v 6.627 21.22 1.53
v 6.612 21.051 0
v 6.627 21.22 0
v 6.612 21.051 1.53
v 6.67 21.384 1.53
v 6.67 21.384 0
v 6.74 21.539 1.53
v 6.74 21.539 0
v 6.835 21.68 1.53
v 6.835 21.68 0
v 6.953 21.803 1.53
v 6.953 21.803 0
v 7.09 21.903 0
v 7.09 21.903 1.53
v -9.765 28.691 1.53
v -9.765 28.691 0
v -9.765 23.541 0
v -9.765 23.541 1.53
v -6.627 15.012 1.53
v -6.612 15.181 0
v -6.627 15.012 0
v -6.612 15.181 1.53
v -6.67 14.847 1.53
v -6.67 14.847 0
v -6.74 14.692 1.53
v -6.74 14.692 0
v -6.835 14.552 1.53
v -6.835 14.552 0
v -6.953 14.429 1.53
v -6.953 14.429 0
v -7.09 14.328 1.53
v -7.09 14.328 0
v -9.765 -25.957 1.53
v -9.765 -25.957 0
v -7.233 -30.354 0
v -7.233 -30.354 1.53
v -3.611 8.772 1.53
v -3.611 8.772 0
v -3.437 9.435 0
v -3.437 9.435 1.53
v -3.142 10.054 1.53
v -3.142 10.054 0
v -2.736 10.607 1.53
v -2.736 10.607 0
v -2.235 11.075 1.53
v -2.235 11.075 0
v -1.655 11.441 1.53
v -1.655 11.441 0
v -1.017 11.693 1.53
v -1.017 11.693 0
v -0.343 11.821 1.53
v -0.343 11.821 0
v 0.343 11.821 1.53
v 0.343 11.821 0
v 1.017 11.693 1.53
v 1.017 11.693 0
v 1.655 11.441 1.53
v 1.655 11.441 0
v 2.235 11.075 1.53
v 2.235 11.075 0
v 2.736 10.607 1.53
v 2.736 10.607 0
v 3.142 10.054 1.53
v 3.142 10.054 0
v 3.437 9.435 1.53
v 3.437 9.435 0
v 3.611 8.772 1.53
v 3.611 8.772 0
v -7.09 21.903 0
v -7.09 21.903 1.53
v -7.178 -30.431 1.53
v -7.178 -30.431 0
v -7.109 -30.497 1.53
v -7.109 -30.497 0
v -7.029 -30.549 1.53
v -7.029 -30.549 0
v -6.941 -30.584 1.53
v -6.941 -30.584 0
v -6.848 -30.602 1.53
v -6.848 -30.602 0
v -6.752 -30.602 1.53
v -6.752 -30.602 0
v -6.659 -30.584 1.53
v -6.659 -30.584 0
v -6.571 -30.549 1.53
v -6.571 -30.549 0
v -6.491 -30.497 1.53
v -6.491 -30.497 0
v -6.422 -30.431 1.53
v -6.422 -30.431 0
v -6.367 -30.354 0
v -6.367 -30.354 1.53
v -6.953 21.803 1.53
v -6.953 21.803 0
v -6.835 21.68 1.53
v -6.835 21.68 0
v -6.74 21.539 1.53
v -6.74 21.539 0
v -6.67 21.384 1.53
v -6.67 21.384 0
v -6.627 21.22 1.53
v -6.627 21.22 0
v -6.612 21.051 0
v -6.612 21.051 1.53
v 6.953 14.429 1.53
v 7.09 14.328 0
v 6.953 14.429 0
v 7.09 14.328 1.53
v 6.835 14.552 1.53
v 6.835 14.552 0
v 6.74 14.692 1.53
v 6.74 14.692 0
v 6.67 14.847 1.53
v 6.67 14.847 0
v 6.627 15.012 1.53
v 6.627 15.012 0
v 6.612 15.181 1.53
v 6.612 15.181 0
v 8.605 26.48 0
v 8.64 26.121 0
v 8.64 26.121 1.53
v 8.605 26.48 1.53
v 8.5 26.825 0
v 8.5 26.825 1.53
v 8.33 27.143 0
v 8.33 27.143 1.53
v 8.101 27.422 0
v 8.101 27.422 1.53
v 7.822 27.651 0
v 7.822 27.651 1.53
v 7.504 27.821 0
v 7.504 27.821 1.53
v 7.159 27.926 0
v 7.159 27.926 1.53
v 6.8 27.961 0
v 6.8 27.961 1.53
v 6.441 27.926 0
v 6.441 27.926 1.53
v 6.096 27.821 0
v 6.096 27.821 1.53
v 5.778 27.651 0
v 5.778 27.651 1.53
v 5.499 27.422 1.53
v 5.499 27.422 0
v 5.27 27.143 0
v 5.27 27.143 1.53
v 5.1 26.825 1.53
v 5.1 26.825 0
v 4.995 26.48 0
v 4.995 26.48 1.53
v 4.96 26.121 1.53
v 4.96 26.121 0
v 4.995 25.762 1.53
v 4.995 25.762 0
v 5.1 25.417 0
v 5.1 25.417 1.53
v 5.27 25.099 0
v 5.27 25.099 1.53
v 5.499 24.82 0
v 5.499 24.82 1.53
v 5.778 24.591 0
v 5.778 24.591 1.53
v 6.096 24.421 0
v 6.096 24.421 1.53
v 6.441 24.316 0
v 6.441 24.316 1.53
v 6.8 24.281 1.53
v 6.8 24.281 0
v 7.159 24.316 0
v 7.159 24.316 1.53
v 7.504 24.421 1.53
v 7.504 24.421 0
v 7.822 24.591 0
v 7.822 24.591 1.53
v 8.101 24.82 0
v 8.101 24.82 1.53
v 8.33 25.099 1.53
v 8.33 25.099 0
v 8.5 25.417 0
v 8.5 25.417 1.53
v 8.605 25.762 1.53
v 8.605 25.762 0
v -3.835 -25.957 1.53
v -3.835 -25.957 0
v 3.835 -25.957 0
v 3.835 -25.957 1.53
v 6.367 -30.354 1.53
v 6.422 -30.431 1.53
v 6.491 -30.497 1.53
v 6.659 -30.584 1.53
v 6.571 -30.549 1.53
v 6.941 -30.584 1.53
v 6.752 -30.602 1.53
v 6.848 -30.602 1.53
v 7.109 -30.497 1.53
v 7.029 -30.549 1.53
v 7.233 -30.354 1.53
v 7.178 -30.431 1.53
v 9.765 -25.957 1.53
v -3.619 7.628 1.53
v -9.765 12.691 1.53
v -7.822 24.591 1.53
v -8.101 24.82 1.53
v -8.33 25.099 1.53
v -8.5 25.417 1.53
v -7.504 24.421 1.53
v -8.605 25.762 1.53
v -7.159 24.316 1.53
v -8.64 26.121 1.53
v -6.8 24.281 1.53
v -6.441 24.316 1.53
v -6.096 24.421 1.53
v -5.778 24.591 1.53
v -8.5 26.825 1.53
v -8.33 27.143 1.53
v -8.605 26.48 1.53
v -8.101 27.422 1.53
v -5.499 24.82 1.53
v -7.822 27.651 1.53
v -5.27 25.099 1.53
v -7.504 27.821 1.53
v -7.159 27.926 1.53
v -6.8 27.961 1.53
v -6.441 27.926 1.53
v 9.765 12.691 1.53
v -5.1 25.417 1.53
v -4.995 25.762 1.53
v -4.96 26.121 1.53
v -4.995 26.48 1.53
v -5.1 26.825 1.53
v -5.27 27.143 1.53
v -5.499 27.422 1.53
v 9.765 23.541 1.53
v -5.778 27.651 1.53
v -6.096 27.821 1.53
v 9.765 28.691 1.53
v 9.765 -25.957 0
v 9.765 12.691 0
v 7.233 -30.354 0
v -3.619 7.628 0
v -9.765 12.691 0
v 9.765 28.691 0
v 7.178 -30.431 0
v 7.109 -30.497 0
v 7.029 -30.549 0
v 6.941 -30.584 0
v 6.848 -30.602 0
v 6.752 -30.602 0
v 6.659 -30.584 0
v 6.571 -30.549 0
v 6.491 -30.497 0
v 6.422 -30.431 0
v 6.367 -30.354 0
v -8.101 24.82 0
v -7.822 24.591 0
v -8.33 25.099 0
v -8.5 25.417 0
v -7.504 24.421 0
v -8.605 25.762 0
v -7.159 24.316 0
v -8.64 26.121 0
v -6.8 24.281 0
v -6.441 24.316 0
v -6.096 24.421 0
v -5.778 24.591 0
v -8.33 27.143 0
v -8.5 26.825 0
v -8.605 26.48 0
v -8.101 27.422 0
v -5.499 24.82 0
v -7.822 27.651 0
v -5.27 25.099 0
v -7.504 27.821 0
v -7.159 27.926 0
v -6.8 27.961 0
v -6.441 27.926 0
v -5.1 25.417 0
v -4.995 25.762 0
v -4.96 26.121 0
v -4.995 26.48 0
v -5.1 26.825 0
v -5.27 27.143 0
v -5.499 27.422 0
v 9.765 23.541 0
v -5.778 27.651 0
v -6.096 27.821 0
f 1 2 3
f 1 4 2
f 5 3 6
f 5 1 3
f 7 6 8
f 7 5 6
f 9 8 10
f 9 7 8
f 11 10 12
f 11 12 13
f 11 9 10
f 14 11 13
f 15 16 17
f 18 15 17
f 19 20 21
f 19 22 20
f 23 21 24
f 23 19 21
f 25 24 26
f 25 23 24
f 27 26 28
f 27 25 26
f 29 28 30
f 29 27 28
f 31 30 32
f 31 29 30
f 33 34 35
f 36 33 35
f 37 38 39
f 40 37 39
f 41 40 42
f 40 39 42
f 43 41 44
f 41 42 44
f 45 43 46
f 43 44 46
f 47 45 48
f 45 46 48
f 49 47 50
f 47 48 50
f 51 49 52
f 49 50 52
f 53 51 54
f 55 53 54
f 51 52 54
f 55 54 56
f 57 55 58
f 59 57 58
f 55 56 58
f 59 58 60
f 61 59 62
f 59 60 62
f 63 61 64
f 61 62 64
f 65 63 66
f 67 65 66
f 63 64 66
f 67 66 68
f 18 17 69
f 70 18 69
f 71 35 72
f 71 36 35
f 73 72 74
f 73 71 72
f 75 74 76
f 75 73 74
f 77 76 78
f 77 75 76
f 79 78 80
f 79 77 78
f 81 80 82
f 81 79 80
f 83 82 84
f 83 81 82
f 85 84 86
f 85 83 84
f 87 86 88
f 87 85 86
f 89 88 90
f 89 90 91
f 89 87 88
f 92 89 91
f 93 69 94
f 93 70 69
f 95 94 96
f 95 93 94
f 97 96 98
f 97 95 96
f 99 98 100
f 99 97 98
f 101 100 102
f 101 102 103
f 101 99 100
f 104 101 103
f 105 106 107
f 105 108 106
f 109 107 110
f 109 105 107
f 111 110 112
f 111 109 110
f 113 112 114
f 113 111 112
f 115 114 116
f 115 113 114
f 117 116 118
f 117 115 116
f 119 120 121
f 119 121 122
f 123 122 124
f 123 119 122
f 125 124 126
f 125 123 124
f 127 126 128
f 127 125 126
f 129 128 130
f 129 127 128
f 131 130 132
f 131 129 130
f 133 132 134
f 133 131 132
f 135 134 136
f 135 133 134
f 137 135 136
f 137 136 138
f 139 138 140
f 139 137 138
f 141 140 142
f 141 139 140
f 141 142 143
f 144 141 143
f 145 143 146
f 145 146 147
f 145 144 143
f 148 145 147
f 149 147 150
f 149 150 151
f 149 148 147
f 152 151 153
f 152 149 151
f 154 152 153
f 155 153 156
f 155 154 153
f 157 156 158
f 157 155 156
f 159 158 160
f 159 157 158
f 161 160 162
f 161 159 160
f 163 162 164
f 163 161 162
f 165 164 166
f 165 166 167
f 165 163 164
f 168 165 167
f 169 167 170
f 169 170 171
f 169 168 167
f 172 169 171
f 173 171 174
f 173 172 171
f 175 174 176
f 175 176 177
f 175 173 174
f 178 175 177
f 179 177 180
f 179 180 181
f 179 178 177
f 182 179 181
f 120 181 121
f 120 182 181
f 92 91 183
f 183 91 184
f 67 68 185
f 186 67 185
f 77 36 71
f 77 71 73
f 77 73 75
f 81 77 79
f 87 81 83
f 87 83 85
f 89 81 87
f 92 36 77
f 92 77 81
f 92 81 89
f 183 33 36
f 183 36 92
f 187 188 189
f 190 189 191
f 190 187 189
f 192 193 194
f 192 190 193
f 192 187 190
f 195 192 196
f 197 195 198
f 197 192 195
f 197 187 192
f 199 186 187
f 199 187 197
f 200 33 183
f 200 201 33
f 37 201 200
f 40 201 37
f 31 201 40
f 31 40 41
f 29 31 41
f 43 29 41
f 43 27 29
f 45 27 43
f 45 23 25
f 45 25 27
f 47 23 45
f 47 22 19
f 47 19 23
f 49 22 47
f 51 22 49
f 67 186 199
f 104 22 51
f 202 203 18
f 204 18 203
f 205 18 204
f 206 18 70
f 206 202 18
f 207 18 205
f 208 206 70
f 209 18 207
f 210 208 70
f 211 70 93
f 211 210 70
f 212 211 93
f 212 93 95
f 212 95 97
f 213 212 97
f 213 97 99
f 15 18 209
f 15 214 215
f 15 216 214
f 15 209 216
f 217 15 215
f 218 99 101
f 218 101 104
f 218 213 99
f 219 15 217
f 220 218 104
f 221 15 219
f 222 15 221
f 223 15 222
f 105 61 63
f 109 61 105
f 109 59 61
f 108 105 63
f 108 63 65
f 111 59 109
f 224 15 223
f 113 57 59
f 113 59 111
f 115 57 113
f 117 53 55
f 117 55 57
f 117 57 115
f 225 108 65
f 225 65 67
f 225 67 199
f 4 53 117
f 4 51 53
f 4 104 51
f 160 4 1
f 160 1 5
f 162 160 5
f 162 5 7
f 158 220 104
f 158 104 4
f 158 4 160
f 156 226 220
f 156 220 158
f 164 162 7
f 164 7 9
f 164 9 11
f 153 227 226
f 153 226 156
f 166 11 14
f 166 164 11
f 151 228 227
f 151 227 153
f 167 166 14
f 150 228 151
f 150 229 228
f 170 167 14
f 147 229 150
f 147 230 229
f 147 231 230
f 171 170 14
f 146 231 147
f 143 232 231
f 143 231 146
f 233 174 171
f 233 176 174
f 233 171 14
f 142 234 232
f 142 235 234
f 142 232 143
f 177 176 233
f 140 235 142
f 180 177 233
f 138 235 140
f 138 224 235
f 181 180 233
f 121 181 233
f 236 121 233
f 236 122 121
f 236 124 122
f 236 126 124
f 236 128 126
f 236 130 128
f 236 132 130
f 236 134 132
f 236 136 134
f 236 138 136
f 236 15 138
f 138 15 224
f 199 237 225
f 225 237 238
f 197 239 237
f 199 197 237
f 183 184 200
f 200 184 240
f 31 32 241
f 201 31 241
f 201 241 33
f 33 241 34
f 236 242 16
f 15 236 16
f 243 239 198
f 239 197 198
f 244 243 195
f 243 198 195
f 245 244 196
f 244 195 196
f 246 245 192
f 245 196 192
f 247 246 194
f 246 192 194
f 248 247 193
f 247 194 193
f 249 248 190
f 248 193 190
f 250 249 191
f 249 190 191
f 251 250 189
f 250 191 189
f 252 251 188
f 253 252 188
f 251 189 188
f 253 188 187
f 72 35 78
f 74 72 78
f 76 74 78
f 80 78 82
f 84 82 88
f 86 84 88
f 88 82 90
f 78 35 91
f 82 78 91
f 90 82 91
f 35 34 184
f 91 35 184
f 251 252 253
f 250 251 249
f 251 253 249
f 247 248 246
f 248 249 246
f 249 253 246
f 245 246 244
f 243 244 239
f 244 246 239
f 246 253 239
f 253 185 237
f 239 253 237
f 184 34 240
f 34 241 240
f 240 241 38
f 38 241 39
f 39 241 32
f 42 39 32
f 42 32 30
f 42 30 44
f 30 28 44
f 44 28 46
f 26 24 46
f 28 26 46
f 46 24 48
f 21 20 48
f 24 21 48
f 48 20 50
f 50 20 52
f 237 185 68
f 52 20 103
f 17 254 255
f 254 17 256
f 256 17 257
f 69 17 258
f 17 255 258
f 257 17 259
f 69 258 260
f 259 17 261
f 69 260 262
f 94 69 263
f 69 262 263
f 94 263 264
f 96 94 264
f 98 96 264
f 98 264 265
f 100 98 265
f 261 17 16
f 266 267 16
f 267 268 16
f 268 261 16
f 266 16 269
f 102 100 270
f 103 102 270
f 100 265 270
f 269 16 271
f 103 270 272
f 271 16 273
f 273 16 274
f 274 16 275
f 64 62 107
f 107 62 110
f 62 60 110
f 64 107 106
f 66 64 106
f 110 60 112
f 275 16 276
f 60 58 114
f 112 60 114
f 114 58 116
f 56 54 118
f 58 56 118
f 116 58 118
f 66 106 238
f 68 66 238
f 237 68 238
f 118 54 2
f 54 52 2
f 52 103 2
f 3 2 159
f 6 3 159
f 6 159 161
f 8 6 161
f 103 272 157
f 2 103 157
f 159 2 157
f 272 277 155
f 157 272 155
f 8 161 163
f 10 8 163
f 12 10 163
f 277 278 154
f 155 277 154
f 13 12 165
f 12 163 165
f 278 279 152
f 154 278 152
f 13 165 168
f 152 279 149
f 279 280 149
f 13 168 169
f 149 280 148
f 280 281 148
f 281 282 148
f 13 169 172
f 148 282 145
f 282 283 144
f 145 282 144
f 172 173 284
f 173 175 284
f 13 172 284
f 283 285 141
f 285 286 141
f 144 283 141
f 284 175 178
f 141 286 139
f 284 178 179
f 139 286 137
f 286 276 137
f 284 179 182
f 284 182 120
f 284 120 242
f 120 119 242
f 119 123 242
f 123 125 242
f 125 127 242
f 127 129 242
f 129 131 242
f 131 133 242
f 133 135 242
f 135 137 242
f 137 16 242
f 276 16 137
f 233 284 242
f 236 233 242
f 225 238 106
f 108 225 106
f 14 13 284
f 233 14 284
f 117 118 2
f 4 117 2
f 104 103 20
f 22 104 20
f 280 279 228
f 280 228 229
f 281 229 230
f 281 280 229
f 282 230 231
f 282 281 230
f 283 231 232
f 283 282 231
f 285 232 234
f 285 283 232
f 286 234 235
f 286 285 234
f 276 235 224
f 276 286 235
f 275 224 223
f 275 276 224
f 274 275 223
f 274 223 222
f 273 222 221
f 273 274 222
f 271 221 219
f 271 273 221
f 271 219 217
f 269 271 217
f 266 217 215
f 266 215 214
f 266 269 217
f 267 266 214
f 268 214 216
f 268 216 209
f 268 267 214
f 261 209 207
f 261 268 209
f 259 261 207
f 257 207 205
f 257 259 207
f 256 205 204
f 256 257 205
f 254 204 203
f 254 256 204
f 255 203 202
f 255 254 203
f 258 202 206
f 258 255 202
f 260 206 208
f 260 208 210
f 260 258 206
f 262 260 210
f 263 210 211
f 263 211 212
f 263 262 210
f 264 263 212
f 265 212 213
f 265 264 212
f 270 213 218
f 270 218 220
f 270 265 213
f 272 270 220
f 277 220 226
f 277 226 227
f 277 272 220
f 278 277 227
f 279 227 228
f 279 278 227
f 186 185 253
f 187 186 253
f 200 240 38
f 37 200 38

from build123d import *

# Parameters (mm, degrees)
F0_R     = 1.84
F1_DEPTH = 1.53
F2_R     = 1
F3_R     = 0.5


with BuildPart() as f1:
    # F0 (on Top) → F1 (new body)
    with BuildSketch(Plane.XY):
        with BuildLine():
            Line((-9.765, 28.690863), (-9.765, 25.180746))
            Line((-9.765, 25.180746), (-9.765, 23.540863))
            Line((-9.765, 23.540863), (-6.612455, 21.610863))
            Line((-6.612455, 21.610863), (-6.612455, 14.620863))
            Line((-6.612455, 14.620863), (-9.765, 12.690863))
            Line((-9.765, 12.690863), (-9.765, -25.956517))
            Line((-9.765, -25.956517), (-3.835, -25.956517))
            Line((-3.835, -25.956517), (-3.618682, 7.628455))
            ThreePointArc((-3.618682, 7.628455), (-3.659924, 8.200425), (-3.611318, 8.771817))
            ThreePointArc((-3.611318, 8.771817), (0, 11.836852), (3.611318, 8.771817))
            Line((3.611318, 8.771817), (3.835, -25.956517))
            Line((3.835, -25.956517), (9.765, -25.956517))
            Line((9.765, -25.956517), (9.765, 12.690863))
            Line((9.765, 12.690863), (6.612455, 14.620863))
            Line((6.612455, 14.620863), (6.612455, 21.610863))
            Line((6.612455, 21.610863), (9.765, 23.540863))
            Line((9.765, 23.540863), (9.765, 25.180746))
            Line((9.765, 25.180746), (9.765, 28.690863))
            Line((9.765, 28.690863), (-9.765, 28.690863))
        make_face()
        with Locations((-6.8, 26.120863)):
            Circle(F0_R, mode=Mode.SUBTRACT)
        with Locations((6.8, 26.120863)):
            Circle(F0_R, mode=Mode.SUBTRACT)
        Polygon((-3.835, -25.956517), (-9.765, -25.956517), (-6.8, -31.106517), align=None)
        with BuildLine():
            ThreePointArc((-3.611318, 8.771817), (-3.659924, 8.200425), (-3.618682, 7.628455))
            Line((-3.618682, 7.628455), (-3.611318, 8.771817))
        make_face()
        Polygon((6.8, -31.106517), (9.765, -25.956517), (3.835, -25.956517), align=None)
    extrude(amount=F1_DEPTH)

    # F2
    f2_edges = [f1.edges().sort_by_distance(p)[0] for p in [
        (6.612455, 21.610863, 0.765),
        (6.612455, 14.620863, 0.765),
        (-6.612455, 21.610863, 0.765),
        (-6.612455, 14.620863, 0.765),
    ]]
    fillet(f2_edges, radius=F2_R)

    # F3
    f3_edges = [f1.edges().sort_by_distance(p)[0] for p in [
        (-6.8, -31.106517, 0.765),
        (6.8, -31.106517, 0.765),
    ]]
    fillet(f3_edges, radius=F3_R)


solid = f1.part
